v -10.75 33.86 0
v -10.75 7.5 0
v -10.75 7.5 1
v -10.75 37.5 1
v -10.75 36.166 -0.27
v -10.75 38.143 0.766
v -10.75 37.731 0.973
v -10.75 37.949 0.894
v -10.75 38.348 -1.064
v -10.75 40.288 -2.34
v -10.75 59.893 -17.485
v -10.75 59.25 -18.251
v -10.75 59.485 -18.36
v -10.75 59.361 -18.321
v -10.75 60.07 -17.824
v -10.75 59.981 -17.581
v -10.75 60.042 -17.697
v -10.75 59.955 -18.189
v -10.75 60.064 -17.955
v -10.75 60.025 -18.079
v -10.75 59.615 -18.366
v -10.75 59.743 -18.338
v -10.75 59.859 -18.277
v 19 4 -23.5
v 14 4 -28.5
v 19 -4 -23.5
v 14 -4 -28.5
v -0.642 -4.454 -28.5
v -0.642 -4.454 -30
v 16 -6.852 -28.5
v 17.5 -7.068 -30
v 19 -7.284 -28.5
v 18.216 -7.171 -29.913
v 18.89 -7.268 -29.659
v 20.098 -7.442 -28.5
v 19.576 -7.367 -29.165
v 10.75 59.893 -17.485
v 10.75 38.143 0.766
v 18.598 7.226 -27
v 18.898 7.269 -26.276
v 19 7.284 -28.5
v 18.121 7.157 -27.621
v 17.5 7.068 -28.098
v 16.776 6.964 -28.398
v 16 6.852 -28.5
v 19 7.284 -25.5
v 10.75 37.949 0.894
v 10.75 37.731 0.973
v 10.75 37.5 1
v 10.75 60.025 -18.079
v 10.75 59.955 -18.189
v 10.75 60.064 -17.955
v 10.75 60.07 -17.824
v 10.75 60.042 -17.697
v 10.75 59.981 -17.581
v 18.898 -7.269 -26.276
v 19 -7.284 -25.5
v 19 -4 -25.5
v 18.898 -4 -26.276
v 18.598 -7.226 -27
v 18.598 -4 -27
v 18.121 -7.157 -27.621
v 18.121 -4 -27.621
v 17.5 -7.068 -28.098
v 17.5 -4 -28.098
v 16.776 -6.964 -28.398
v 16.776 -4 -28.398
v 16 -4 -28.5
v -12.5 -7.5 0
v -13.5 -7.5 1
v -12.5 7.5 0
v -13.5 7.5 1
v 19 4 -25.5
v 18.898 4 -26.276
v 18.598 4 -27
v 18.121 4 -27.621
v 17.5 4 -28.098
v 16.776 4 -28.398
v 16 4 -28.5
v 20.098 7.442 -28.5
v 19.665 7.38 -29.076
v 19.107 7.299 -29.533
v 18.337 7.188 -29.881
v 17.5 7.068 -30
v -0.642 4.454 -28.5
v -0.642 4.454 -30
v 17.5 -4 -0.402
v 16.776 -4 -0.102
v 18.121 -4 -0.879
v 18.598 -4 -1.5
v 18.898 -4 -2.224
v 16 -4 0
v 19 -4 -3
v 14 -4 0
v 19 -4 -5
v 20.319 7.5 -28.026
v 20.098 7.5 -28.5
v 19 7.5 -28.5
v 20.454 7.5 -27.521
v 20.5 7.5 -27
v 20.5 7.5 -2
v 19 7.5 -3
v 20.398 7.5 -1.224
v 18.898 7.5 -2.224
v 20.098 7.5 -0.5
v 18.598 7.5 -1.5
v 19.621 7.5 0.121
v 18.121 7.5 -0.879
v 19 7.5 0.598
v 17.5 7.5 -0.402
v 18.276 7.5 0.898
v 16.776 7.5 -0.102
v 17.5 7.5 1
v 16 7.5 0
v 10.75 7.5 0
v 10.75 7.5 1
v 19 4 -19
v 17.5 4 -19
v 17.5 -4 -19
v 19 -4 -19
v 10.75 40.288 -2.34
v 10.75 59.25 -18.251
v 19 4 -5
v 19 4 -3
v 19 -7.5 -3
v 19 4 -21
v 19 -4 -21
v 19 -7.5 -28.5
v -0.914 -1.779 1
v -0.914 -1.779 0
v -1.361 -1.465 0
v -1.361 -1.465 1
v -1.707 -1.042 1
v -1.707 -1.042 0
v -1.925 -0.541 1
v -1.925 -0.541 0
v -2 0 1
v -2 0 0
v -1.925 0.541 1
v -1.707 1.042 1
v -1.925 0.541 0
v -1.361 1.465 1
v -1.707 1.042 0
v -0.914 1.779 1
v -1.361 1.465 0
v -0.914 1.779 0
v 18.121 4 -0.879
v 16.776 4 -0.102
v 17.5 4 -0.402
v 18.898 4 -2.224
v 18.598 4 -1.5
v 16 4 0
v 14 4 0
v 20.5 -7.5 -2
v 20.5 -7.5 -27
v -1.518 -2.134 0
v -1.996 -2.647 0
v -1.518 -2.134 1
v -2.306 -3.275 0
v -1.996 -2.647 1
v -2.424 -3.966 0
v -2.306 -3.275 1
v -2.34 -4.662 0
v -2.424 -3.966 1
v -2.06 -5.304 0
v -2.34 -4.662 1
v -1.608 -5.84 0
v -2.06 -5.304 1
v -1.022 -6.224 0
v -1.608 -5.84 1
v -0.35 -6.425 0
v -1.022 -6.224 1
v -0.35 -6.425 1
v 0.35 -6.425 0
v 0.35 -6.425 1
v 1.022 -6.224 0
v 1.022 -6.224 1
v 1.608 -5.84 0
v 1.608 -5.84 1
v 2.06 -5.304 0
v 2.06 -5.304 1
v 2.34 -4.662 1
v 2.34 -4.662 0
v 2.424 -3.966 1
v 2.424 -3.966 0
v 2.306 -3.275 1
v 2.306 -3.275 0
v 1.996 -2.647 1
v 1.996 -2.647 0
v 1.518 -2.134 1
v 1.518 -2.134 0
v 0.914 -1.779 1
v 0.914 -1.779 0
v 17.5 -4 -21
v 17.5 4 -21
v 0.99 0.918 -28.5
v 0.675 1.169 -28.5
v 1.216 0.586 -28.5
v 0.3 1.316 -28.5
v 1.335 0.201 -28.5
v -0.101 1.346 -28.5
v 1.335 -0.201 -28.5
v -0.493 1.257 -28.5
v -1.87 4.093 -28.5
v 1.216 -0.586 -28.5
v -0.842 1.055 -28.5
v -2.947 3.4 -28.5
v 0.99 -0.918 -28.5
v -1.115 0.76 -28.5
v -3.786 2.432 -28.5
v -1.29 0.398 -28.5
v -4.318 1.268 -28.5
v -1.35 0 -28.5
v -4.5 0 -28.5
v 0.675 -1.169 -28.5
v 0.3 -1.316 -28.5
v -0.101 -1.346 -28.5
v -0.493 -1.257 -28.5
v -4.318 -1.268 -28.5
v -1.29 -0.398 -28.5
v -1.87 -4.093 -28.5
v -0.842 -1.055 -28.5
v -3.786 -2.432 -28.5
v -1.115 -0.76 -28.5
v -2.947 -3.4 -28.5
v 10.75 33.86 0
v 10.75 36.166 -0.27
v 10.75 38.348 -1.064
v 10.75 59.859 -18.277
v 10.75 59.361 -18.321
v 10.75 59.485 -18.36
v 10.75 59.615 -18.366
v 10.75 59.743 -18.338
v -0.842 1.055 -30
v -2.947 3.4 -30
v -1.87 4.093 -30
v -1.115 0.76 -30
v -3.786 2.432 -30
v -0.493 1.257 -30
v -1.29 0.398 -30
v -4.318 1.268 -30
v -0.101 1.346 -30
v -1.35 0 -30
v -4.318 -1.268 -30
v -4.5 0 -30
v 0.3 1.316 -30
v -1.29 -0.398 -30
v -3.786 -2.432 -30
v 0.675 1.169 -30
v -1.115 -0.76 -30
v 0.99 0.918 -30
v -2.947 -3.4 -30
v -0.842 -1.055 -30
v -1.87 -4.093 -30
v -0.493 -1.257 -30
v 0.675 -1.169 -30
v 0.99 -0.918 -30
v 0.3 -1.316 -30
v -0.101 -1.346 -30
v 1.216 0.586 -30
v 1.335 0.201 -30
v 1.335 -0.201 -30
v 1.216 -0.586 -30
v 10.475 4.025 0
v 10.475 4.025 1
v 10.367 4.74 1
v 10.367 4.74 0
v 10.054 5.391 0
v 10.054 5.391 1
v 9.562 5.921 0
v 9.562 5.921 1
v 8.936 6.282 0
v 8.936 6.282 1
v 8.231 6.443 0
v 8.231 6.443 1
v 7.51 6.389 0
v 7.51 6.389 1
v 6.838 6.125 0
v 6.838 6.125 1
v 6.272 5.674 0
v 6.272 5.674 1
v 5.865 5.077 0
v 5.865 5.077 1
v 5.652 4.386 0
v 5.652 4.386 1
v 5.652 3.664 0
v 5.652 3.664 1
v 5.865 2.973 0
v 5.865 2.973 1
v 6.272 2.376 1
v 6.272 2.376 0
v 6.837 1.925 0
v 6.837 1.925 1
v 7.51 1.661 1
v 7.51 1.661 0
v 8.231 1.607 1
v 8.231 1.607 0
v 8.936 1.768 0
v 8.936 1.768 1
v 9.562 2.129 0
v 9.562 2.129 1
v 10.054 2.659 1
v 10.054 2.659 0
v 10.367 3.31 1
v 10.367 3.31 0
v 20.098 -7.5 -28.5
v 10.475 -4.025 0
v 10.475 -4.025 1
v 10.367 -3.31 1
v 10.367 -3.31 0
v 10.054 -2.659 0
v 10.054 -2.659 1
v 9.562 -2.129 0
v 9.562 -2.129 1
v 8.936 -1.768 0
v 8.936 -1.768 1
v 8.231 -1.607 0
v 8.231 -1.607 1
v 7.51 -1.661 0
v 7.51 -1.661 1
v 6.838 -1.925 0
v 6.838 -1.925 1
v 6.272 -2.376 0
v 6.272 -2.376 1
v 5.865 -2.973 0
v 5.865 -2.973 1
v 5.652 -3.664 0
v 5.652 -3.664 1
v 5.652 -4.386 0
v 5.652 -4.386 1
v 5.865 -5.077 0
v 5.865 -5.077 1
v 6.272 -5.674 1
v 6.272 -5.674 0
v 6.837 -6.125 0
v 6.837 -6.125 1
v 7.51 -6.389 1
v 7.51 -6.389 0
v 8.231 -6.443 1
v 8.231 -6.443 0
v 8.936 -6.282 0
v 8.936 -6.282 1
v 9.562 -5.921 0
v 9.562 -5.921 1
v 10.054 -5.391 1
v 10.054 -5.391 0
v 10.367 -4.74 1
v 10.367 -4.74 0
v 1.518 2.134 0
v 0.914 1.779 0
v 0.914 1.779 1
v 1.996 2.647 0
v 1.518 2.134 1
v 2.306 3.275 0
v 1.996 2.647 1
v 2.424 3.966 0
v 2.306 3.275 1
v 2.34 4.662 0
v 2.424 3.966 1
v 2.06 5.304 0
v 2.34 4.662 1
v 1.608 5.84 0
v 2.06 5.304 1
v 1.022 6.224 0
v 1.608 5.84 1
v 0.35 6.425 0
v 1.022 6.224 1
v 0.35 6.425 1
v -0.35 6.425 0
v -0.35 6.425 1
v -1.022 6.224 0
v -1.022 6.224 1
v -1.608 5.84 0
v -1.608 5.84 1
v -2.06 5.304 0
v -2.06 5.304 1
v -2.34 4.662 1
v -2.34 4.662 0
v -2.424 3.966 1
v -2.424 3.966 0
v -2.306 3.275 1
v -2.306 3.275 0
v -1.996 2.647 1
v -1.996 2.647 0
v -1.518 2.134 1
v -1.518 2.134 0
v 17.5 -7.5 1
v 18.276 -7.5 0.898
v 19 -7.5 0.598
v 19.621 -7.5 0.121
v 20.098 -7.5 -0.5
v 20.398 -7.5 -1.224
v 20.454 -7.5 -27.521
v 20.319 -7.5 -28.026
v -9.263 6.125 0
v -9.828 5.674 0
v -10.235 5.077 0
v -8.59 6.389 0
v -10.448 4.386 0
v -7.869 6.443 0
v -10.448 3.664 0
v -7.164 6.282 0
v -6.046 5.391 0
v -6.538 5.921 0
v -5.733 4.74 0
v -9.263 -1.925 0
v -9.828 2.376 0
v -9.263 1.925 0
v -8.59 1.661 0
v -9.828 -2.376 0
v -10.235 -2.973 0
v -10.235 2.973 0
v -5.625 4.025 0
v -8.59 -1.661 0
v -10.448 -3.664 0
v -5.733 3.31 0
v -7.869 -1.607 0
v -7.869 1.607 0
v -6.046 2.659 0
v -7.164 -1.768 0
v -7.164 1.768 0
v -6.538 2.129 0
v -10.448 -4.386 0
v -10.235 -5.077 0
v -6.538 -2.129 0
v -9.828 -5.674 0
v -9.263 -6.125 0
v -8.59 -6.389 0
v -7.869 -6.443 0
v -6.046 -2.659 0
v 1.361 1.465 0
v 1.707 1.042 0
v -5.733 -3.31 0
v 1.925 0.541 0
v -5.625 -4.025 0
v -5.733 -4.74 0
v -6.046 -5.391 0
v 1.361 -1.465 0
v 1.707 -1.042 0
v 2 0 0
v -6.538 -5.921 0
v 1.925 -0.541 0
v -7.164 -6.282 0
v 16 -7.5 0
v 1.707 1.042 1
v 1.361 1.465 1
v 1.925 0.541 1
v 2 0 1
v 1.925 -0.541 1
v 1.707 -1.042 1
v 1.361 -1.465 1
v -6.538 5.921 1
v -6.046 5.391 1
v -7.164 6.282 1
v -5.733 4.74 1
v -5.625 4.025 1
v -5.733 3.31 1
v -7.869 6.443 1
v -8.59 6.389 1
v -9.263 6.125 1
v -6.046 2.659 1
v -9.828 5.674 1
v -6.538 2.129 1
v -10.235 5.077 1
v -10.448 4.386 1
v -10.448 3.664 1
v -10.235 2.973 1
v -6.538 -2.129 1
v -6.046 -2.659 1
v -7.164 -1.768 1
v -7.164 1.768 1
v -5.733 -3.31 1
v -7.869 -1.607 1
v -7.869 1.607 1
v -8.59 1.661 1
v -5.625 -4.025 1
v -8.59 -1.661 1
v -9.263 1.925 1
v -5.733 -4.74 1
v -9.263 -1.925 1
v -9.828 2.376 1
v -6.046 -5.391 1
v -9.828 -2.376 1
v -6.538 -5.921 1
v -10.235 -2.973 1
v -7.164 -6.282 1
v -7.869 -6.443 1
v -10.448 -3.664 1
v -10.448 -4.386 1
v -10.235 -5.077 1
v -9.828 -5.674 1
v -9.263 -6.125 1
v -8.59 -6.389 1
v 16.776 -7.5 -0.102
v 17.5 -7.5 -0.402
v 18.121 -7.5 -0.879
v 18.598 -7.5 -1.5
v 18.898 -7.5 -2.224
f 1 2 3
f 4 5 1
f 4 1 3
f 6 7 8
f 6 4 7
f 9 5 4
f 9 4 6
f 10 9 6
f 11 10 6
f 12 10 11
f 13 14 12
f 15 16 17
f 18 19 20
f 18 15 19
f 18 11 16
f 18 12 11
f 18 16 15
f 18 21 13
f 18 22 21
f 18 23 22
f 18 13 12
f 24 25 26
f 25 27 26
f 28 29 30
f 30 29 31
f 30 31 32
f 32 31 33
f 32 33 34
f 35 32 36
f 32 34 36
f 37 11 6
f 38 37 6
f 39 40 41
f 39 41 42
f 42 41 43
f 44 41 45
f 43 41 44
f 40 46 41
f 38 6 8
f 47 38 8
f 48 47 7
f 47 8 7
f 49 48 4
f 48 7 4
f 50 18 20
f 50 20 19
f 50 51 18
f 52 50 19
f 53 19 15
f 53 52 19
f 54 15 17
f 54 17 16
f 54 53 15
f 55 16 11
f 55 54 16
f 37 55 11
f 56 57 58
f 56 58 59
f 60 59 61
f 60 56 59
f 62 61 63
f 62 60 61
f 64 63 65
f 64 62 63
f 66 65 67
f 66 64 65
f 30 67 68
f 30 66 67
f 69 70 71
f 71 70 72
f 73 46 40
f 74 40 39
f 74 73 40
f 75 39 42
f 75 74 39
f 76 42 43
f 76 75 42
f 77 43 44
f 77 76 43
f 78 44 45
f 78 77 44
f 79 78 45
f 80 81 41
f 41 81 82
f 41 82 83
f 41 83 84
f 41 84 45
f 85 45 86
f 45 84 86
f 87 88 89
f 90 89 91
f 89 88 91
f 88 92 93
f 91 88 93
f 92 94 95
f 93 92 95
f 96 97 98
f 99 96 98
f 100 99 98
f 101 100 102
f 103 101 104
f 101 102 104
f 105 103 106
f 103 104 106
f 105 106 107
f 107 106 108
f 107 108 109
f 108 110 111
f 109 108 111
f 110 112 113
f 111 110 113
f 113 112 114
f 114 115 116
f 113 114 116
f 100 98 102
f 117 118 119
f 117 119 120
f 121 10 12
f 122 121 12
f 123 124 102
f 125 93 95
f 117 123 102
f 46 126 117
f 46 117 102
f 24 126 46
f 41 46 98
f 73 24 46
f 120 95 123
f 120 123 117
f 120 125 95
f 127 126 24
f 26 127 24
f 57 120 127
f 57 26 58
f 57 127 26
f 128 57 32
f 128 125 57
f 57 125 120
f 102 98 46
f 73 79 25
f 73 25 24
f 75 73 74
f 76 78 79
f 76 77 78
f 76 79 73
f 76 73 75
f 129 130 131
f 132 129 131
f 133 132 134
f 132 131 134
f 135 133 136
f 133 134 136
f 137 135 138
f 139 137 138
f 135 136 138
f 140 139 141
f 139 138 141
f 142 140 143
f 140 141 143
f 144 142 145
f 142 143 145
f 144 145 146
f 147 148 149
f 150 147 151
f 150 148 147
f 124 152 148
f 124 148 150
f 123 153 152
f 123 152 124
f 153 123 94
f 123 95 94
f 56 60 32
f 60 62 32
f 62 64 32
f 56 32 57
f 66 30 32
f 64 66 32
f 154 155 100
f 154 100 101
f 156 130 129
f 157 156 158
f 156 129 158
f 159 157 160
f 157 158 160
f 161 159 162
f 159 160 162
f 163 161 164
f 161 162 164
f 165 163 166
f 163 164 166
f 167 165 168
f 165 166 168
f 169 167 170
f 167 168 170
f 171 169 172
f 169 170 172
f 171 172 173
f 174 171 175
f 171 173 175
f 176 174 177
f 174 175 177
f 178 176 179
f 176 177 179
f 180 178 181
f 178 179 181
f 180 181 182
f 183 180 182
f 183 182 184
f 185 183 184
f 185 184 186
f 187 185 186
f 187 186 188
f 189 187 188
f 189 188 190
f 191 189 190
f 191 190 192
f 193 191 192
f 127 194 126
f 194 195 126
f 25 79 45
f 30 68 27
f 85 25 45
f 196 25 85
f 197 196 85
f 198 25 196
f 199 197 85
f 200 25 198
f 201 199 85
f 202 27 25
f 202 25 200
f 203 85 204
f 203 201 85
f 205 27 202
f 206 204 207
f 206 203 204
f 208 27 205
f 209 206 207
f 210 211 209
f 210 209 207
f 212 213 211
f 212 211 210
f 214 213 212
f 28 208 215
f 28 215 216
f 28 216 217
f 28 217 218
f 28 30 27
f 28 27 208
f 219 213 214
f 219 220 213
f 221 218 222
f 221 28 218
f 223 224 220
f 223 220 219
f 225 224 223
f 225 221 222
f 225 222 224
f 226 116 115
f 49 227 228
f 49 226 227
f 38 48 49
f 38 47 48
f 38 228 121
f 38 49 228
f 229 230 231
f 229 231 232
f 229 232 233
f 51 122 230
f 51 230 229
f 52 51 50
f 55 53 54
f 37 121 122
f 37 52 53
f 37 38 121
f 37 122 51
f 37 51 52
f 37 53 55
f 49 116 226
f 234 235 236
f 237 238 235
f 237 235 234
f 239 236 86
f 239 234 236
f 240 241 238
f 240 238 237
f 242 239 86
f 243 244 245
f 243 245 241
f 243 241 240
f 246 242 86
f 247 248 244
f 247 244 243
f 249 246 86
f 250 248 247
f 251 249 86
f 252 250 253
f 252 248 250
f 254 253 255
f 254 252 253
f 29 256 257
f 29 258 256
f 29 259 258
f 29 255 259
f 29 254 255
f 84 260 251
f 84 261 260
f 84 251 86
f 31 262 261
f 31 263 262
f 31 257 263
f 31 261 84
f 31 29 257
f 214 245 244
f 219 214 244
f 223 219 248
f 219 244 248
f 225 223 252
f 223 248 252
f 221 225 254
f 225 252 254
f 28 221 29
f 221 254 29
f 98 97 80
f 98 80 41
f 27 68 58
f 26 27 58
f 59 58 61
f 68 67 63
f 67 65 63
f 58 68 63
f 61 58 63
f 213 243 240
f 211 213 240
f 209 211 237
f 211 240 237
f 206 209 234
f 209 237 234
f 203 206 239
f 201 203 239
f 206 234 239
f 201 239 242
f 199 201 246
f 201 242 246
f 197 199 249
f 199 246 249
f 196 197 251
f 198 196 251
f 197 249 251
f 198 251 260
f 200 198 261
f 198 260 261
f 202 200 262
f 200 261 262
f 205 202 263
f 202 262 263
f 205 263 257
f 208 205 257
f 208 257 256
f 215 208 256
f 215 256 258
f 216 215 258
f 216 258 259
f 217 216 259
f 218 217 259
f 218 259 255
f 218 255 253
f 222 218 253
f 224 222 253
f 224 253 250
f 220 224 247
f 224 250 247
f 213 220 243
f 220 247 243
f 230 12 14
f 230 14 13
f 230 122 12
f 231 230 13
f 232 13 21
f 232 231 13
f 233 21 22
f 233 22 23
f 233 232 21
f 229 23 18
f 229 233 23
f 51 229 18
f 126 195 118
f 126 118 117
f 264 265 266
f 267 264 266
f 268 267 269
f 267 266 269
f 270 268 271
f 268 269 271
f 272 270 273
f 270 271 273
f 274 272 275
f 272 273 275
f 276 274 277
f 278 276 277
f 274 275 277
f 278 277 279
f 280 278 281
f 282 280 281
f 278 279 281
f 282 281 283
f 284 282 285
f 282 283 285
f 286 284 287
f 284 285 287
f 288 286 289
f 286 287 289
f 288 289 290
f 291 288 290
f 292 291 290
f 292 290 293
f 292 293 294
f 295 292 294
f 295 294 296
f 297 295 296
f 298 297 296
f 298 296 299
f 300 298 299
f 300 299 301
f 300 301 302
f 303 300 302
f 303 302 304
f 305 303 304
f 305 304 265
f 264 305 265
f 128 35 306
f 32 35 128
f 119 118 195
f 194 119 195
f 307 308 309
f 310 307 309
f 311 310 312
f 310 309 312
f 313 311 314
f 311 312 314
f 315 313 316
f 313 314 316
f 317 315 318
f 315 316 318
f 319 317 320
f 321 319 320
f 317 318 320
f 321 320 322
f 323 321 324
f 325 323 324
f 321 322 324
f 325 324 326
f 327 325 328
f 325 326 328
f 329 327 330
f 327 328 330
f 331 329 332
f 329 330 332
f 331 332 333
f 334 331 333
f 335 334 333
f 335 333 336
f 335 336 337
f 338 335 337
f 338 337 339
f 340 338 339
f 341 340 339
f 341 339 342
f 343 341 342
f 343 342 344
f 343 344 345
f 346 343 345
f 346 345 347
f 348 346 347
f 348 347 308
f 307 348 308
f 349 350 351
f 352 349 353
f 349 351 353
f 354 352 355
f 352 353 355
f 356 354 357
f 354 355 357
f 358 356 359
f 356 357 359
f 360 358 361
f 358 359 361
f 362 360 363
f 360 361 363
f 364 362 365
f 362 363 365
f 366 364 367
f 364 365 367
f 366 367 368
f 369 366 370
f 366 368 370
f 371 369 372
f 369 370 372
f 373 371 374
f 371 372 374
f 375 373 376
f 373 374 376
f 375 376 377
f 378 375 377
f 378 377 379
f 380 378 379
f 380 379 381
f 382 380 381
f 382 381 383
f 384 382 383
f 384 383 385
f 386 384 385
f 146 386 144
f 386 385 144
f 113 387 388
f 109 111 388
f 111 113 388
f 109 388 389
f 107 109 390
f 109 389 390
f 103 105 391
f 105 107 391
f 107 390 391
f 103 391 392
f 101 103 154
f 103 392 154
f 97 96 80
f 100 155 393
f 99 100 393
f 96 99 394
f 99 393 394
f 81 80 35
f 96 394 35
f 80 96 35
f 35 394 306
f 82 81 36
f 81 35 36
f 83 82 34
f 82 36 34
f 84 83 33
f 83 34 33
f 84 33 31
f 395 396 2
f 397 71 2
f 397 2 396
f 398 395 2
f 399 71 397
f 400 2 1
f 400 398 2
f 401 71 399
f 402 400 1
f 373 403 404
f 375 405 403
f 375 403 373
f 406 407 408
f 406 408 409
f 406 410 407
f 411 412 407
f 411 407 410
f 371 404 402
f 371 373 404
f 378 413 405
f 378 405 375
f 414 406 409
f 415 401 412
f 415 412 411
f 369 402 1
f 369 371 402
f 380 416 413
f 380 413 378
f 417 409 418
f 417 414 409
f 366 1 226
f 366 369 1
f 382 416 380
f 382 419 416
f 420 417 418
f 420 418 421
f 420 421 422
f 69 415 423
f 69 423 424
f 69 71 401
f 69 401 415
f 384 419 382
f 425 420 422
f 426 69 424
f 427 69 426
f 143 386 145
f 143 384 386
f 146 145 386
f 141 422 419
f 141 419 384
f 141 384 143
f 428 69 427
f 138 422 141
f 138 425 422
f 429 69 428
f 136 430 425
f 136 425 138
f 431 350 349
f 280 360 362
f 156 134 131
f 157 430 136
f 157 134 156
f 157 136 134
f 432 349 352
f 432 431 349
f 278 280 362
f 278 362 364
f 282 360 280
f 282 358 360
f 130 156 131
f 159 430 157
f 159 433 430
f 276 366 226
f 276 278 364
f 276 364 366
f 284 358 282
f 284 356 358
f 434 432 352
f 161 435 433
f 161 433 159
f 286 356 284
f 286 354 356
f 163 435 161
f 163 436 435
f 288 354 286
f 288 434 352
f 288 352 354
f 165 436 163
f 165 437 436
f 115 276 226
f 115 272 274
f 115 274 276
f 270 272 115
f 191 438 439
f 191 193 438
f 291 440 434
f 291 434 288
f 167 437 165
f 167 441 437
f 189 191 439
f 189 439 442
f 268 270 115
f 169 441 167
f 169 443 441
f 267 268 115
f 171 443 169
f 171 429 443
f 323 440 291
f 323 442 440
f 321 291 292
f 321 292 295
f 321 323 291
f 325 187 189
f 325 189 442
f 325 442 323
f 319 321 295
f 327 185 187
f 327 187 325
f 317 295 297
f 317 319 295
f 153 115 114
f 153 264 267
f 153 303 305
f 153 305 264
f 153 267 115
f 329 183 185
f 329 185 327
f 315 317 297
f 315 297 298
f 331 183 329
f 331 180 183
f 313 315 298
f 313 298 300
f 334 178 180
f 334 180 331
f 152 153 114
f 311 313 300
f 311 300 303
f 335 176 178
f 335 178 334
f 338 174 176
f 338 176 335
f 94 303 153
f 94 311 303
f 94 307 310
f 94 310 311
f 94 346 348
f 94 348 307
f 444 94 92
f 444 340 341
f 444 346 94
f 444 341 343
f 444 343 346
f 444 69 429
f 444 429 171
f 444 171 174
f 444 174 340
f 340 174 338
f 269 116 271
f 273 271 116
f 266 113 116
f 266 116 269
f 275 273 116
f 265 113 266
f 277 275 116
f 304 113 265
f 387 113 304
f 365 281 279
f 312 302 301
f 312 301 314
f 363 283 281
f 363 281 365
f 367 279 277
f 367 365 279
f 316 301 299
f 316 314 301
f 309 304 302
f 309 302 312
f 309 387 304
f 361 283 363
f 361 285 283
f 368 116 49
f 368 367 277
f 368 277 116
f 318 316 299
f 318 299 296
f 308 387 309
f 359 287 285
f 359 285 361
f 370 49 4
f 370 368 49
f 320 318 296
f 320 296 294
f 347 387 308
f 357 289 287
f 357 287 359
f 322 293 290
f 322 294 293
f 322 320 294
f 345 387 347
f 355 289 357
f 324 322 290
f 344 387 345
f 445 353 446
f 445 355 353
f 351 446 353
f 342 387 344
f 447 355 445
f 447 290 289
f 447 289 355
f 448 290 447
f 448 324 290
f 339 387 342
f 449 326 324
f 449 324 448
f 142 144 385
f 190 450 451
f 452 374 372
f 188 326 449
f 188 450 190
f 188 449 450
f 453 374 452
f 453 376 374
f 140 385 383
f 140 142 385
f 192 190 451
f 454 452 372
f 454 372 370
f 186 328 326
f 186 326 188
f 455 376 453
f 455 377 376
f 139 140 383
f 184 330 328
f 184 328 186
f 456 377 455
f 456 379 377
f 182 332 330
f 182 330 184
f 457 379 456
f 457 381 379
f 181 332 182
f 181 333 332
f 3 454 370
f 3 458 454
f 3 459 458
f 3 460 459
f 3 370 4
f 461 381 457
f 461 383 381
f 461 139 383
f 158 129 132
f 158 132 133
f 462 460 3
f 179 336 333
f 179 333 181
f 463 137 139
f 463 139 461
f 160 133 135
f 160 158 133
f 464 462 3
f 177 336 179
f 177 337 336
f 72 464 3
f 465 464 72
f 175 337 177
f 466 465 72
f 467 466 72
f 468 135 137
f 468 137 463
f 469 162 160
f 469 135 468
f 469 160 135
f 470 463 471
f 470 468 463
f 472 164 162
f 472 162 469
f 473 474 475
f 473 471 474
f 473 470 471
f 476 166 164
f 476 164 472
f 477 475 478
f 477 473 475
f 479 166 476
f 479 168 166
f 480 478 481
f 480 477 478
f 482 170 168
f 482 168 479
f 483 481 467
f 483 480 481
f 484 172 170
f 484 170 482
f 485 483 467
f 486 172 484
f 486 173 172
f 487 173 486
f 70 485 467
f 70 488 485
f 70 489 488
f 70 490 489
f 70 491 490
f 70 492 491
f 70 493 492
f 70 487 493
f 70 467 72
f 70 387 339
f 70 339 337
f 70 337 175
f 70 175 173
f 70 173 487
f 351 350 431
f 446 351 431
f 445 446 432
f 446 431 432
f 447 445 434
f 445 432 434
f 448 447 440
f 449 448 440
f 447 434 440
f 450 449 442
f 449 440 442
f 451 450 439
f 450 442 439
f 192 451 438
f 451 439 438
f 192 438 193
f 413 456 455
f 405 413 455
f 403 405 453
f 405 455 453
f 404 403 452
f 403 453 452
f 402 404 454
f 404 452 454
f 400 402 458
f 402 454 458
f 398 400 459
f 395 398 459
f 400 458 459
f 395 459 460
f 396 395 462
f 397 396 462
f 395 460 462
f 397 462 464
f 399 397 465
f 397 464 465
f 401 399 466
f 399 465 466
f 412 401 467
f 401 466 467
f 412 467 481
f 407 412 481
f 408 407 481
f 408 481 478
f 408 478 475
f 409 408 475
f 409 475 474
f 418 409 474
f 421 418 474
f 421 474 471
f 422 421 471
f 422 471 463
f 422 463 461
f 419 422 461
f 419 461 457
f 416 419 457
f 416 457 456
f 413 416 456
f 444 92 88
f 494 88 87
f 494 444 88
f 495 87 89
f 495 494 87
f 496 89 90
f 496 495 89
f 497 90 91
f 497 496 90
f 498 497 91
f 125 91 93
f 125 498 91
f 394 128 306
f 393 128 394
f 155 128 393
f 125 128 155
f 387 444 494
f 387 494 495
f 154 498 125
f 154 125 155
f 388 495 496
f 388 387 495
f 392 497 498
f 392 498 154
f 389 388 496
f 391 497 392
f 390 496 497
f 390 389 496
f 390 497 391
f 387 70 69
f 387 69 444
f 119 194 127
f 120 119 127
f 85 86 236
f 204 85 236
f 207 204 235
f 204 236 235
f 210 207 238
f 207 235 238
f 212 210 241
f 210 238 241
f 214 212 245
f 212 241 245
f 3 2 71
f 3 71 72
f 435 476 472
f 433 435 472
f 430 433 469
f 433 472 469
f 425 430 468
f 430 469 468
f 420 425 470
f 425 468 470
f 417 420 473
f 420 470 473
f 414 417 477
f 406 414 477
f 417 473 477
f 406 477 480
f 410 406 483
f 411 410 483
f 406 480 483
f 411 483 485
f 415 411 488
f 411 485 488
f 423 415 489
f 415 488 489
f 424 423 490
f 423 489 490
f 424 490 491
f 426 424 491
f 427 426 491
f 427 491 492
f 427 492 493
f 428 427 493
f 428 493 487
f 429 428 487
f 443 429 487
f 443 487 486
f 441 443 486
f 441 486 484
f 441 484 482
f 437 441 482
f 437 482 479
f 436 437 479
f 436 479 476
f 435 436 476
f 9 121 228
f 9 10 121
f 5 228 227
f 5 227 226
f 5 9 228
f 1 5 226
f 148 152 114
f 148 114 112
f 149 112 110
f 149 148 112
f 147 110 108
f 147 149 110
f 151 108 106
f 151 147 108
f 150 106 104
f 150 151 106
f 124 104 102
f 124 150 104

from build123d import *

# Parameters (mm, degrees)
SKETCH_1_W                  = 27
SKETCH_1_H                  = 15
EXTRUDE_1_DEPTH             = 1
SKETCH_2_R                  = 2.425
CUT_EXTRUDE_1_DEPTH         = 16.475787541
EXTRUDE_2_DEPTH             = 15
SKETCH_6_W                  = 1.5
SKETCH_6_H                  = 2
EXTRUDE_3_DEPTH             = 4
SKETCH_7_R                  = 1.35
CUT_EXTRUDE_3_DEPTH         = 1.5
FILLET_1_R                  = 3
CHAMFER_1_SIZE              = 1
CUT_EXTRUDE_4_REACH         = 39.101
SKETCH_8_R                  = 2
SKETCH_9_W                  = 21.5
SKETCH_9_H                  = 30
EXTRUDE_4_DEPTH             = 1
EXTRUDE_5_REACH             = 54.216
EXTRUDE_5_DIRECTION_2_REACH = 54.216
FILLET_2_R                  = 10
FILLET_3_R                  = 0.5


# Some blends are built 0.0001 mm under size
with BuildPart() as part:
    # 草图1 → 凸台-拉伸1 (new body)
    with BuildSketch(Plane.XY):
        Rectangle(SKETCH_1_W, SKETCH_1_H)
    extrude(amount=EXTRUDE_1_DEPTH)

    # 草图2 → 切除-拉伸1 (cut, through all)
    with BuildSketch(Plane.XY.offset(1)):
        with Locations((0, 4.025)):
            Circle(SKETCH_2_R)
        with Locations((0, -4.025)):
            Circle(SKETCH_2_R)
        with Locations((8.05, 4.025)):
            Circle(SKETCH_2_R)
        with Locations((8.05, -4.025)):
            Circle(SKETCH_2_R)
        with Locations((-8.05, 4.025)):
            Circle(SKETCH_2_R)
        with Locations((-8.05, -4.025)):
            Circle(SKETCH_2_R)
    extrude(amount=-CUT_EXTRUDE_1_DEPTH, mode=Mode.SUBTRACT)

    # 草图3 → 凸台-拉伸2 (add)
    with BuildSketch(Plane.XZ.offset(7.5)):
        Polygon((13.5, 0), (19, 0), (19, -28.5), (-4.5, -28.5), (-4.5, -30), (20.5, -30), (20.5, 1), (13.5, 1), align=None)
    extrude(amount=-EXTRUDE_2_DEPTH)

    # 草图6 → 凸台-拉伸3 (add, symmetric)
    with BuildSketch(Plane(origin=(0, 0, 0), x_dir=(1, 0, 0), z_dir=(0, 1, 0))):
        Polygon((19, 0), (19, 5), (14, 0), align=None)
        Polygon((19, 28.5), (14, 28.5), (19, 23.5), align=None)
        with Locations((18.25, 20)):
            Rectangle(SKETCH_6_W, SKETCH_6_H)
    extrude(amount=EXTRUDE_3_DEPTH, both=True)

    # 草图7 → 切除-拉伸3 (cut)
    with BuildSketch(Plane(origin=(0, 0, -30), x_dir=(-1, 0, 0), z_dir=(0, 0, -1))):
        with BuildLine():
            ThreePointArc((4.5, 0), (3.401301202, -2.946379157), (0.641711051, -4.454010207))
            Line((0.641711051, -4.454010207), (-20.5, -7.5))
            Line((-20.5, -7.5), (4.5, -7.5))
            Line((4.5, -7.5), (4.5, 0))
        make_face()
        with BuildLine():
            Line((-20.5, 7.5), (0.641711051, 4.454010207))
            ThreePointArc((0.641711051, 4.454010207), (3.401301202, 2.946379157), (4.5, 0))
            Line((4.5, 0), (4.5, 7.5))
            Line((4.5, 7.5), (-20.5, 7.5))
        make_face()
        Circle(SKETCH_7_R)
    extrude(amount=-CUT_EXTRUDE_3_DEPTH, mode=Mode.SUBTRACT)

    # 圆角1
    # the kernel refuses this fillet: 3 mm, written as the material it adds along each edge
    with BuildSketch(Plane(origin=(19, -3.5, -28.5), x_dir=(-1, 0, 0), z_dir=(0, 1, 0))) as fillet_1_piece_1_section:
        with BuildLine():
            CenterArc((FILLET_1_R, FILLET_1_R), FILLET_1_R, 180, 90)
            Line((0, FILLET_1_R), (0, 0))
            Line((0, 0), (FILLET_1_R, 0))
        make_face()
    fillet_1_piece_1 = extrude(amount=18.283887658, mode=Mode.PRIVATE)
    fillet_1_piece_1 = split(fillet_1_piece_1, bisect_by=Plane(origin=(18.119115161, 7.156974268, -27.821481802), z_dir=(0.1426024558755584, -0.9897800460598605, 0)), keep=Keep.TOP, mode=Mode.PRIVATE)
    add(fillet_1_piece_1)
    with BuildSketch(Plane(origin=(19, -3.5, 0), x_dir=(0, 0, -1), z_dir=(0, 1, 0)), Plane(origin=(19, -7.5, 0), x_dir=(0, 0, -1), z_dir=(0, 1, 0))) as fillet_1_piece_2:
        with BuildLine():
            CenterArc((FILLET_1_R, FILLET_1_R), FILLET_1_R, 180, 90)
            Line((0, FILLET_1_R), (0, 0))
            Line((0, 0), (FILLET_1_R, 0))
        make_face()
    extrude(amount=11)
    with BuildSketch(Plane(origin=(19, -14.783887658, -28.5), x_dir=(-1, 0, 0), z_dir=(0, 1, 0))) as fillet_1_piece_3_section:
        with BuildLine():
            CenterArc((FILLET_1_R, FILLET_1_R), FILLET_1_R, 180, 90)
            Line((0, FILLET_1_R), (0, 0))
            Line((0, 0), (FILLET_1_R, 0))
        make_face()
    fillet_1_piece_3 = extrude(amount=18.283887658, mode=Mode.PRIVATE)
    fillet_1_piece_3 = split(fillet_1_piece_3, bisect_by=Plane(origin=(18.119115161, -7.156974268, -27.821481802), z_dir=(0.1426024558755584, 0.9897800460598605, 0)), keep=Keep.TOP, mode=Mode.PRIVATE)
    add(fillet_1_piece_3)
    # the kernel refuses this fillet: 3 mm, written as the material it takes off along each edge
    with BuildSketch(Plane(origin=(20.5, -15, 1), x_dir=(0, 0, -1), z_dir=(0, 1, 0))) as fillet_1_2_piece_1:
        with BuildLine():
            CenterArc((FILLET_1_R, FILLET_1_R), FILLET_1_R, 180, 90)
            Line((0, FILLET_1_R), (0, 0))
            Line((0, 0), (FILLET_1_R, 0))
        make_face()
    extrude(amount=30, mode=Mode.SUBTRACT)
    with BuildSketch(Plane(origin=(20.5, -15, -30), x_dir=(0, 0, 1), z_dir=(0, 1, 0))) as fillet_1_2_piece_2:
        with BuildLine():
            CenterArc((FILLET_1_R, -FILLET_1_R), FILLET_1_R, 90, 90)
            Line((0, -FILLET_1_R), (0, 0))
            Line((0, 0), (FILLET_1_R, 0))
        make_face()
    extrude(amount=30, mode=Mode.SUBTRACT)

    # 倒角1
    chamfer_1_edges = [part.edges().sort_by_distance(p)[0] for p in [
        (-13.5, 0, 0),
    ]]
    chamfer(chamfer_1_edges, length=CHAMFER_1_SIZE - 0.0001)  # a hair under: the kernel refuses the full size

    # 草图8 → 切除-拉伸4 (cut, up to next)
    with BuildSketch(Plane(origin=(0, 0, 0), x_dir=(-1, 0, 0), z_dir=(0, 0, -1)), mode=Mode.PRIVATE) as cut_extrude_4_sk1:
        Circle(SKETCH_8_R)
    cut_extrude_4_tool1 = extrude(cut_extrude_4_sk1.sketch, amount=-CUT_EXTRUDE_4_REACH, mode=Mode.PRIVATE) & part.part
    add(cut_extrude_4_tool1.solids().sort_by_distance((0, 0, 0))[0], mode=Mode.SUBTRACT)

    # 草图9 → 凸台-拉伸4 (add)
    with BuildSketch(Plane.XY.offset(1)):
        with Locations((0, 22.5)):
            Rectangle(SKETCH_9_W, SKETCH_9_H)
    extrude(amount=-EXTRUDE_4_DEPTH)

    # 凸台-拉伸5: up to this face of the body (flat: up to its plane)
    extrude_5_end = Plane(part.part.faces().sort_by_distance((-10.75, 22.5, 0.5))[0])
    # 草图10 → 凸台-拉伸5 (add, up to the picked face)
    with BuildSketch(Plane(origin=(0, 0, 0), x_dir=(0, 0, -1), z_dir=(1, 0, 0)), mode=Mode.PRIVATE) as extrude_5_sk1:
        with BuildLine():
            Line((-1, 37.5), (0, 37.5))
            Line((0, 37.5), (18.572123903, 59.633395384))
            Line((18.572123903, 59.633395384), (17.80607946, 60.276182993))
            Line((17.80607946, 60.276182993), (-0.766044443, 38.14278761))
            ThreePointArc((-0.766044443, 38.14278761), (-0.939692621, 37.842020143), (-1, 37.5))
        make_face()
    extrude_5_tool1 = split(extrude(extrude_5_sk1.sketch, amount=-EXTRUDE_5_REACH, mode=Mode.PRIVATE), bisect_by=extrude_5_end, keep=Keep.BOTH, mode=Mode.PRIVATE)
    add(extrude_5_tool1.solids().sort_by(Axis((0, 48.754818, -8.789436), (-1, 0, 0)))[0])

    # 凸台-拉伸5 direction 2: up to this face of the body (flat: up to its plane)
    extrude_5_direction_2_end = Plane(part.part.faces().sort_by_distance((10.75, 22.5, 0.5))[0])
    # 草图10 → 凸台-拉伸5 direction 2 (add, up to the picked face)
    with BuildSketch(Plane(origin=(0, 0, 0), x_dir=(0, 0, -1), z_dir=(1, 0, 0)), mode=Mode.PRIVATE) as extrude_5_direction_2_sk1:
        with BuildLine():
            Line((-1, 37.5), (0, 37.5))
            Line((0, 37.5), (18.572123903, 59.633395384))
            Line((18.572123903, 59.633395384), (17.80607946, 60.276182993))
            Line((17.80607946, 60.276182993), (-0.766044443, 38.14278761))
            ThreePointArc((-0.766044443, 38.14278761), (-0.939692621, 37.842020143), (-1, 37.5))
        make_face()
    extrude_5_direction_2_tool1 = split(extrude(extrude_5_direction_2_sk1.sketch, amount=EXTRUDE_5_DIRECTION_2_REACH, mode=Mode.PRIVATE), bisect_by=extrude_5_direction_2_end, keep=Keep.BOTH, mode=Mode.PRIVATE)
    add(extrude_5_direction_2_tool1.solids().sort_by(Axis((0, 48.754818, -8.789436), (1, 0, 0)))[0])

    # 圆角2
    fillet_2_edges = [part.edges().sort_by_distance(p)[0] for p in [
        (0, 37.5, 0),
    ]]
    fillet(fillet_2_edges, radius=FILLET_2_R)

    # 圆角3
    fillet_3_edges = [part.edges().sort_by_distance(p)[0] for p in [
        (0, 60.276182993, -17.80607946),
        (0, 59.633395384, -18.572123903),
    ]]
    fillet(fillet_3_edges, radius=FILLET_3_R - 0.0001)  # a hair under: the kernel refuses the full size


solid = part.part
